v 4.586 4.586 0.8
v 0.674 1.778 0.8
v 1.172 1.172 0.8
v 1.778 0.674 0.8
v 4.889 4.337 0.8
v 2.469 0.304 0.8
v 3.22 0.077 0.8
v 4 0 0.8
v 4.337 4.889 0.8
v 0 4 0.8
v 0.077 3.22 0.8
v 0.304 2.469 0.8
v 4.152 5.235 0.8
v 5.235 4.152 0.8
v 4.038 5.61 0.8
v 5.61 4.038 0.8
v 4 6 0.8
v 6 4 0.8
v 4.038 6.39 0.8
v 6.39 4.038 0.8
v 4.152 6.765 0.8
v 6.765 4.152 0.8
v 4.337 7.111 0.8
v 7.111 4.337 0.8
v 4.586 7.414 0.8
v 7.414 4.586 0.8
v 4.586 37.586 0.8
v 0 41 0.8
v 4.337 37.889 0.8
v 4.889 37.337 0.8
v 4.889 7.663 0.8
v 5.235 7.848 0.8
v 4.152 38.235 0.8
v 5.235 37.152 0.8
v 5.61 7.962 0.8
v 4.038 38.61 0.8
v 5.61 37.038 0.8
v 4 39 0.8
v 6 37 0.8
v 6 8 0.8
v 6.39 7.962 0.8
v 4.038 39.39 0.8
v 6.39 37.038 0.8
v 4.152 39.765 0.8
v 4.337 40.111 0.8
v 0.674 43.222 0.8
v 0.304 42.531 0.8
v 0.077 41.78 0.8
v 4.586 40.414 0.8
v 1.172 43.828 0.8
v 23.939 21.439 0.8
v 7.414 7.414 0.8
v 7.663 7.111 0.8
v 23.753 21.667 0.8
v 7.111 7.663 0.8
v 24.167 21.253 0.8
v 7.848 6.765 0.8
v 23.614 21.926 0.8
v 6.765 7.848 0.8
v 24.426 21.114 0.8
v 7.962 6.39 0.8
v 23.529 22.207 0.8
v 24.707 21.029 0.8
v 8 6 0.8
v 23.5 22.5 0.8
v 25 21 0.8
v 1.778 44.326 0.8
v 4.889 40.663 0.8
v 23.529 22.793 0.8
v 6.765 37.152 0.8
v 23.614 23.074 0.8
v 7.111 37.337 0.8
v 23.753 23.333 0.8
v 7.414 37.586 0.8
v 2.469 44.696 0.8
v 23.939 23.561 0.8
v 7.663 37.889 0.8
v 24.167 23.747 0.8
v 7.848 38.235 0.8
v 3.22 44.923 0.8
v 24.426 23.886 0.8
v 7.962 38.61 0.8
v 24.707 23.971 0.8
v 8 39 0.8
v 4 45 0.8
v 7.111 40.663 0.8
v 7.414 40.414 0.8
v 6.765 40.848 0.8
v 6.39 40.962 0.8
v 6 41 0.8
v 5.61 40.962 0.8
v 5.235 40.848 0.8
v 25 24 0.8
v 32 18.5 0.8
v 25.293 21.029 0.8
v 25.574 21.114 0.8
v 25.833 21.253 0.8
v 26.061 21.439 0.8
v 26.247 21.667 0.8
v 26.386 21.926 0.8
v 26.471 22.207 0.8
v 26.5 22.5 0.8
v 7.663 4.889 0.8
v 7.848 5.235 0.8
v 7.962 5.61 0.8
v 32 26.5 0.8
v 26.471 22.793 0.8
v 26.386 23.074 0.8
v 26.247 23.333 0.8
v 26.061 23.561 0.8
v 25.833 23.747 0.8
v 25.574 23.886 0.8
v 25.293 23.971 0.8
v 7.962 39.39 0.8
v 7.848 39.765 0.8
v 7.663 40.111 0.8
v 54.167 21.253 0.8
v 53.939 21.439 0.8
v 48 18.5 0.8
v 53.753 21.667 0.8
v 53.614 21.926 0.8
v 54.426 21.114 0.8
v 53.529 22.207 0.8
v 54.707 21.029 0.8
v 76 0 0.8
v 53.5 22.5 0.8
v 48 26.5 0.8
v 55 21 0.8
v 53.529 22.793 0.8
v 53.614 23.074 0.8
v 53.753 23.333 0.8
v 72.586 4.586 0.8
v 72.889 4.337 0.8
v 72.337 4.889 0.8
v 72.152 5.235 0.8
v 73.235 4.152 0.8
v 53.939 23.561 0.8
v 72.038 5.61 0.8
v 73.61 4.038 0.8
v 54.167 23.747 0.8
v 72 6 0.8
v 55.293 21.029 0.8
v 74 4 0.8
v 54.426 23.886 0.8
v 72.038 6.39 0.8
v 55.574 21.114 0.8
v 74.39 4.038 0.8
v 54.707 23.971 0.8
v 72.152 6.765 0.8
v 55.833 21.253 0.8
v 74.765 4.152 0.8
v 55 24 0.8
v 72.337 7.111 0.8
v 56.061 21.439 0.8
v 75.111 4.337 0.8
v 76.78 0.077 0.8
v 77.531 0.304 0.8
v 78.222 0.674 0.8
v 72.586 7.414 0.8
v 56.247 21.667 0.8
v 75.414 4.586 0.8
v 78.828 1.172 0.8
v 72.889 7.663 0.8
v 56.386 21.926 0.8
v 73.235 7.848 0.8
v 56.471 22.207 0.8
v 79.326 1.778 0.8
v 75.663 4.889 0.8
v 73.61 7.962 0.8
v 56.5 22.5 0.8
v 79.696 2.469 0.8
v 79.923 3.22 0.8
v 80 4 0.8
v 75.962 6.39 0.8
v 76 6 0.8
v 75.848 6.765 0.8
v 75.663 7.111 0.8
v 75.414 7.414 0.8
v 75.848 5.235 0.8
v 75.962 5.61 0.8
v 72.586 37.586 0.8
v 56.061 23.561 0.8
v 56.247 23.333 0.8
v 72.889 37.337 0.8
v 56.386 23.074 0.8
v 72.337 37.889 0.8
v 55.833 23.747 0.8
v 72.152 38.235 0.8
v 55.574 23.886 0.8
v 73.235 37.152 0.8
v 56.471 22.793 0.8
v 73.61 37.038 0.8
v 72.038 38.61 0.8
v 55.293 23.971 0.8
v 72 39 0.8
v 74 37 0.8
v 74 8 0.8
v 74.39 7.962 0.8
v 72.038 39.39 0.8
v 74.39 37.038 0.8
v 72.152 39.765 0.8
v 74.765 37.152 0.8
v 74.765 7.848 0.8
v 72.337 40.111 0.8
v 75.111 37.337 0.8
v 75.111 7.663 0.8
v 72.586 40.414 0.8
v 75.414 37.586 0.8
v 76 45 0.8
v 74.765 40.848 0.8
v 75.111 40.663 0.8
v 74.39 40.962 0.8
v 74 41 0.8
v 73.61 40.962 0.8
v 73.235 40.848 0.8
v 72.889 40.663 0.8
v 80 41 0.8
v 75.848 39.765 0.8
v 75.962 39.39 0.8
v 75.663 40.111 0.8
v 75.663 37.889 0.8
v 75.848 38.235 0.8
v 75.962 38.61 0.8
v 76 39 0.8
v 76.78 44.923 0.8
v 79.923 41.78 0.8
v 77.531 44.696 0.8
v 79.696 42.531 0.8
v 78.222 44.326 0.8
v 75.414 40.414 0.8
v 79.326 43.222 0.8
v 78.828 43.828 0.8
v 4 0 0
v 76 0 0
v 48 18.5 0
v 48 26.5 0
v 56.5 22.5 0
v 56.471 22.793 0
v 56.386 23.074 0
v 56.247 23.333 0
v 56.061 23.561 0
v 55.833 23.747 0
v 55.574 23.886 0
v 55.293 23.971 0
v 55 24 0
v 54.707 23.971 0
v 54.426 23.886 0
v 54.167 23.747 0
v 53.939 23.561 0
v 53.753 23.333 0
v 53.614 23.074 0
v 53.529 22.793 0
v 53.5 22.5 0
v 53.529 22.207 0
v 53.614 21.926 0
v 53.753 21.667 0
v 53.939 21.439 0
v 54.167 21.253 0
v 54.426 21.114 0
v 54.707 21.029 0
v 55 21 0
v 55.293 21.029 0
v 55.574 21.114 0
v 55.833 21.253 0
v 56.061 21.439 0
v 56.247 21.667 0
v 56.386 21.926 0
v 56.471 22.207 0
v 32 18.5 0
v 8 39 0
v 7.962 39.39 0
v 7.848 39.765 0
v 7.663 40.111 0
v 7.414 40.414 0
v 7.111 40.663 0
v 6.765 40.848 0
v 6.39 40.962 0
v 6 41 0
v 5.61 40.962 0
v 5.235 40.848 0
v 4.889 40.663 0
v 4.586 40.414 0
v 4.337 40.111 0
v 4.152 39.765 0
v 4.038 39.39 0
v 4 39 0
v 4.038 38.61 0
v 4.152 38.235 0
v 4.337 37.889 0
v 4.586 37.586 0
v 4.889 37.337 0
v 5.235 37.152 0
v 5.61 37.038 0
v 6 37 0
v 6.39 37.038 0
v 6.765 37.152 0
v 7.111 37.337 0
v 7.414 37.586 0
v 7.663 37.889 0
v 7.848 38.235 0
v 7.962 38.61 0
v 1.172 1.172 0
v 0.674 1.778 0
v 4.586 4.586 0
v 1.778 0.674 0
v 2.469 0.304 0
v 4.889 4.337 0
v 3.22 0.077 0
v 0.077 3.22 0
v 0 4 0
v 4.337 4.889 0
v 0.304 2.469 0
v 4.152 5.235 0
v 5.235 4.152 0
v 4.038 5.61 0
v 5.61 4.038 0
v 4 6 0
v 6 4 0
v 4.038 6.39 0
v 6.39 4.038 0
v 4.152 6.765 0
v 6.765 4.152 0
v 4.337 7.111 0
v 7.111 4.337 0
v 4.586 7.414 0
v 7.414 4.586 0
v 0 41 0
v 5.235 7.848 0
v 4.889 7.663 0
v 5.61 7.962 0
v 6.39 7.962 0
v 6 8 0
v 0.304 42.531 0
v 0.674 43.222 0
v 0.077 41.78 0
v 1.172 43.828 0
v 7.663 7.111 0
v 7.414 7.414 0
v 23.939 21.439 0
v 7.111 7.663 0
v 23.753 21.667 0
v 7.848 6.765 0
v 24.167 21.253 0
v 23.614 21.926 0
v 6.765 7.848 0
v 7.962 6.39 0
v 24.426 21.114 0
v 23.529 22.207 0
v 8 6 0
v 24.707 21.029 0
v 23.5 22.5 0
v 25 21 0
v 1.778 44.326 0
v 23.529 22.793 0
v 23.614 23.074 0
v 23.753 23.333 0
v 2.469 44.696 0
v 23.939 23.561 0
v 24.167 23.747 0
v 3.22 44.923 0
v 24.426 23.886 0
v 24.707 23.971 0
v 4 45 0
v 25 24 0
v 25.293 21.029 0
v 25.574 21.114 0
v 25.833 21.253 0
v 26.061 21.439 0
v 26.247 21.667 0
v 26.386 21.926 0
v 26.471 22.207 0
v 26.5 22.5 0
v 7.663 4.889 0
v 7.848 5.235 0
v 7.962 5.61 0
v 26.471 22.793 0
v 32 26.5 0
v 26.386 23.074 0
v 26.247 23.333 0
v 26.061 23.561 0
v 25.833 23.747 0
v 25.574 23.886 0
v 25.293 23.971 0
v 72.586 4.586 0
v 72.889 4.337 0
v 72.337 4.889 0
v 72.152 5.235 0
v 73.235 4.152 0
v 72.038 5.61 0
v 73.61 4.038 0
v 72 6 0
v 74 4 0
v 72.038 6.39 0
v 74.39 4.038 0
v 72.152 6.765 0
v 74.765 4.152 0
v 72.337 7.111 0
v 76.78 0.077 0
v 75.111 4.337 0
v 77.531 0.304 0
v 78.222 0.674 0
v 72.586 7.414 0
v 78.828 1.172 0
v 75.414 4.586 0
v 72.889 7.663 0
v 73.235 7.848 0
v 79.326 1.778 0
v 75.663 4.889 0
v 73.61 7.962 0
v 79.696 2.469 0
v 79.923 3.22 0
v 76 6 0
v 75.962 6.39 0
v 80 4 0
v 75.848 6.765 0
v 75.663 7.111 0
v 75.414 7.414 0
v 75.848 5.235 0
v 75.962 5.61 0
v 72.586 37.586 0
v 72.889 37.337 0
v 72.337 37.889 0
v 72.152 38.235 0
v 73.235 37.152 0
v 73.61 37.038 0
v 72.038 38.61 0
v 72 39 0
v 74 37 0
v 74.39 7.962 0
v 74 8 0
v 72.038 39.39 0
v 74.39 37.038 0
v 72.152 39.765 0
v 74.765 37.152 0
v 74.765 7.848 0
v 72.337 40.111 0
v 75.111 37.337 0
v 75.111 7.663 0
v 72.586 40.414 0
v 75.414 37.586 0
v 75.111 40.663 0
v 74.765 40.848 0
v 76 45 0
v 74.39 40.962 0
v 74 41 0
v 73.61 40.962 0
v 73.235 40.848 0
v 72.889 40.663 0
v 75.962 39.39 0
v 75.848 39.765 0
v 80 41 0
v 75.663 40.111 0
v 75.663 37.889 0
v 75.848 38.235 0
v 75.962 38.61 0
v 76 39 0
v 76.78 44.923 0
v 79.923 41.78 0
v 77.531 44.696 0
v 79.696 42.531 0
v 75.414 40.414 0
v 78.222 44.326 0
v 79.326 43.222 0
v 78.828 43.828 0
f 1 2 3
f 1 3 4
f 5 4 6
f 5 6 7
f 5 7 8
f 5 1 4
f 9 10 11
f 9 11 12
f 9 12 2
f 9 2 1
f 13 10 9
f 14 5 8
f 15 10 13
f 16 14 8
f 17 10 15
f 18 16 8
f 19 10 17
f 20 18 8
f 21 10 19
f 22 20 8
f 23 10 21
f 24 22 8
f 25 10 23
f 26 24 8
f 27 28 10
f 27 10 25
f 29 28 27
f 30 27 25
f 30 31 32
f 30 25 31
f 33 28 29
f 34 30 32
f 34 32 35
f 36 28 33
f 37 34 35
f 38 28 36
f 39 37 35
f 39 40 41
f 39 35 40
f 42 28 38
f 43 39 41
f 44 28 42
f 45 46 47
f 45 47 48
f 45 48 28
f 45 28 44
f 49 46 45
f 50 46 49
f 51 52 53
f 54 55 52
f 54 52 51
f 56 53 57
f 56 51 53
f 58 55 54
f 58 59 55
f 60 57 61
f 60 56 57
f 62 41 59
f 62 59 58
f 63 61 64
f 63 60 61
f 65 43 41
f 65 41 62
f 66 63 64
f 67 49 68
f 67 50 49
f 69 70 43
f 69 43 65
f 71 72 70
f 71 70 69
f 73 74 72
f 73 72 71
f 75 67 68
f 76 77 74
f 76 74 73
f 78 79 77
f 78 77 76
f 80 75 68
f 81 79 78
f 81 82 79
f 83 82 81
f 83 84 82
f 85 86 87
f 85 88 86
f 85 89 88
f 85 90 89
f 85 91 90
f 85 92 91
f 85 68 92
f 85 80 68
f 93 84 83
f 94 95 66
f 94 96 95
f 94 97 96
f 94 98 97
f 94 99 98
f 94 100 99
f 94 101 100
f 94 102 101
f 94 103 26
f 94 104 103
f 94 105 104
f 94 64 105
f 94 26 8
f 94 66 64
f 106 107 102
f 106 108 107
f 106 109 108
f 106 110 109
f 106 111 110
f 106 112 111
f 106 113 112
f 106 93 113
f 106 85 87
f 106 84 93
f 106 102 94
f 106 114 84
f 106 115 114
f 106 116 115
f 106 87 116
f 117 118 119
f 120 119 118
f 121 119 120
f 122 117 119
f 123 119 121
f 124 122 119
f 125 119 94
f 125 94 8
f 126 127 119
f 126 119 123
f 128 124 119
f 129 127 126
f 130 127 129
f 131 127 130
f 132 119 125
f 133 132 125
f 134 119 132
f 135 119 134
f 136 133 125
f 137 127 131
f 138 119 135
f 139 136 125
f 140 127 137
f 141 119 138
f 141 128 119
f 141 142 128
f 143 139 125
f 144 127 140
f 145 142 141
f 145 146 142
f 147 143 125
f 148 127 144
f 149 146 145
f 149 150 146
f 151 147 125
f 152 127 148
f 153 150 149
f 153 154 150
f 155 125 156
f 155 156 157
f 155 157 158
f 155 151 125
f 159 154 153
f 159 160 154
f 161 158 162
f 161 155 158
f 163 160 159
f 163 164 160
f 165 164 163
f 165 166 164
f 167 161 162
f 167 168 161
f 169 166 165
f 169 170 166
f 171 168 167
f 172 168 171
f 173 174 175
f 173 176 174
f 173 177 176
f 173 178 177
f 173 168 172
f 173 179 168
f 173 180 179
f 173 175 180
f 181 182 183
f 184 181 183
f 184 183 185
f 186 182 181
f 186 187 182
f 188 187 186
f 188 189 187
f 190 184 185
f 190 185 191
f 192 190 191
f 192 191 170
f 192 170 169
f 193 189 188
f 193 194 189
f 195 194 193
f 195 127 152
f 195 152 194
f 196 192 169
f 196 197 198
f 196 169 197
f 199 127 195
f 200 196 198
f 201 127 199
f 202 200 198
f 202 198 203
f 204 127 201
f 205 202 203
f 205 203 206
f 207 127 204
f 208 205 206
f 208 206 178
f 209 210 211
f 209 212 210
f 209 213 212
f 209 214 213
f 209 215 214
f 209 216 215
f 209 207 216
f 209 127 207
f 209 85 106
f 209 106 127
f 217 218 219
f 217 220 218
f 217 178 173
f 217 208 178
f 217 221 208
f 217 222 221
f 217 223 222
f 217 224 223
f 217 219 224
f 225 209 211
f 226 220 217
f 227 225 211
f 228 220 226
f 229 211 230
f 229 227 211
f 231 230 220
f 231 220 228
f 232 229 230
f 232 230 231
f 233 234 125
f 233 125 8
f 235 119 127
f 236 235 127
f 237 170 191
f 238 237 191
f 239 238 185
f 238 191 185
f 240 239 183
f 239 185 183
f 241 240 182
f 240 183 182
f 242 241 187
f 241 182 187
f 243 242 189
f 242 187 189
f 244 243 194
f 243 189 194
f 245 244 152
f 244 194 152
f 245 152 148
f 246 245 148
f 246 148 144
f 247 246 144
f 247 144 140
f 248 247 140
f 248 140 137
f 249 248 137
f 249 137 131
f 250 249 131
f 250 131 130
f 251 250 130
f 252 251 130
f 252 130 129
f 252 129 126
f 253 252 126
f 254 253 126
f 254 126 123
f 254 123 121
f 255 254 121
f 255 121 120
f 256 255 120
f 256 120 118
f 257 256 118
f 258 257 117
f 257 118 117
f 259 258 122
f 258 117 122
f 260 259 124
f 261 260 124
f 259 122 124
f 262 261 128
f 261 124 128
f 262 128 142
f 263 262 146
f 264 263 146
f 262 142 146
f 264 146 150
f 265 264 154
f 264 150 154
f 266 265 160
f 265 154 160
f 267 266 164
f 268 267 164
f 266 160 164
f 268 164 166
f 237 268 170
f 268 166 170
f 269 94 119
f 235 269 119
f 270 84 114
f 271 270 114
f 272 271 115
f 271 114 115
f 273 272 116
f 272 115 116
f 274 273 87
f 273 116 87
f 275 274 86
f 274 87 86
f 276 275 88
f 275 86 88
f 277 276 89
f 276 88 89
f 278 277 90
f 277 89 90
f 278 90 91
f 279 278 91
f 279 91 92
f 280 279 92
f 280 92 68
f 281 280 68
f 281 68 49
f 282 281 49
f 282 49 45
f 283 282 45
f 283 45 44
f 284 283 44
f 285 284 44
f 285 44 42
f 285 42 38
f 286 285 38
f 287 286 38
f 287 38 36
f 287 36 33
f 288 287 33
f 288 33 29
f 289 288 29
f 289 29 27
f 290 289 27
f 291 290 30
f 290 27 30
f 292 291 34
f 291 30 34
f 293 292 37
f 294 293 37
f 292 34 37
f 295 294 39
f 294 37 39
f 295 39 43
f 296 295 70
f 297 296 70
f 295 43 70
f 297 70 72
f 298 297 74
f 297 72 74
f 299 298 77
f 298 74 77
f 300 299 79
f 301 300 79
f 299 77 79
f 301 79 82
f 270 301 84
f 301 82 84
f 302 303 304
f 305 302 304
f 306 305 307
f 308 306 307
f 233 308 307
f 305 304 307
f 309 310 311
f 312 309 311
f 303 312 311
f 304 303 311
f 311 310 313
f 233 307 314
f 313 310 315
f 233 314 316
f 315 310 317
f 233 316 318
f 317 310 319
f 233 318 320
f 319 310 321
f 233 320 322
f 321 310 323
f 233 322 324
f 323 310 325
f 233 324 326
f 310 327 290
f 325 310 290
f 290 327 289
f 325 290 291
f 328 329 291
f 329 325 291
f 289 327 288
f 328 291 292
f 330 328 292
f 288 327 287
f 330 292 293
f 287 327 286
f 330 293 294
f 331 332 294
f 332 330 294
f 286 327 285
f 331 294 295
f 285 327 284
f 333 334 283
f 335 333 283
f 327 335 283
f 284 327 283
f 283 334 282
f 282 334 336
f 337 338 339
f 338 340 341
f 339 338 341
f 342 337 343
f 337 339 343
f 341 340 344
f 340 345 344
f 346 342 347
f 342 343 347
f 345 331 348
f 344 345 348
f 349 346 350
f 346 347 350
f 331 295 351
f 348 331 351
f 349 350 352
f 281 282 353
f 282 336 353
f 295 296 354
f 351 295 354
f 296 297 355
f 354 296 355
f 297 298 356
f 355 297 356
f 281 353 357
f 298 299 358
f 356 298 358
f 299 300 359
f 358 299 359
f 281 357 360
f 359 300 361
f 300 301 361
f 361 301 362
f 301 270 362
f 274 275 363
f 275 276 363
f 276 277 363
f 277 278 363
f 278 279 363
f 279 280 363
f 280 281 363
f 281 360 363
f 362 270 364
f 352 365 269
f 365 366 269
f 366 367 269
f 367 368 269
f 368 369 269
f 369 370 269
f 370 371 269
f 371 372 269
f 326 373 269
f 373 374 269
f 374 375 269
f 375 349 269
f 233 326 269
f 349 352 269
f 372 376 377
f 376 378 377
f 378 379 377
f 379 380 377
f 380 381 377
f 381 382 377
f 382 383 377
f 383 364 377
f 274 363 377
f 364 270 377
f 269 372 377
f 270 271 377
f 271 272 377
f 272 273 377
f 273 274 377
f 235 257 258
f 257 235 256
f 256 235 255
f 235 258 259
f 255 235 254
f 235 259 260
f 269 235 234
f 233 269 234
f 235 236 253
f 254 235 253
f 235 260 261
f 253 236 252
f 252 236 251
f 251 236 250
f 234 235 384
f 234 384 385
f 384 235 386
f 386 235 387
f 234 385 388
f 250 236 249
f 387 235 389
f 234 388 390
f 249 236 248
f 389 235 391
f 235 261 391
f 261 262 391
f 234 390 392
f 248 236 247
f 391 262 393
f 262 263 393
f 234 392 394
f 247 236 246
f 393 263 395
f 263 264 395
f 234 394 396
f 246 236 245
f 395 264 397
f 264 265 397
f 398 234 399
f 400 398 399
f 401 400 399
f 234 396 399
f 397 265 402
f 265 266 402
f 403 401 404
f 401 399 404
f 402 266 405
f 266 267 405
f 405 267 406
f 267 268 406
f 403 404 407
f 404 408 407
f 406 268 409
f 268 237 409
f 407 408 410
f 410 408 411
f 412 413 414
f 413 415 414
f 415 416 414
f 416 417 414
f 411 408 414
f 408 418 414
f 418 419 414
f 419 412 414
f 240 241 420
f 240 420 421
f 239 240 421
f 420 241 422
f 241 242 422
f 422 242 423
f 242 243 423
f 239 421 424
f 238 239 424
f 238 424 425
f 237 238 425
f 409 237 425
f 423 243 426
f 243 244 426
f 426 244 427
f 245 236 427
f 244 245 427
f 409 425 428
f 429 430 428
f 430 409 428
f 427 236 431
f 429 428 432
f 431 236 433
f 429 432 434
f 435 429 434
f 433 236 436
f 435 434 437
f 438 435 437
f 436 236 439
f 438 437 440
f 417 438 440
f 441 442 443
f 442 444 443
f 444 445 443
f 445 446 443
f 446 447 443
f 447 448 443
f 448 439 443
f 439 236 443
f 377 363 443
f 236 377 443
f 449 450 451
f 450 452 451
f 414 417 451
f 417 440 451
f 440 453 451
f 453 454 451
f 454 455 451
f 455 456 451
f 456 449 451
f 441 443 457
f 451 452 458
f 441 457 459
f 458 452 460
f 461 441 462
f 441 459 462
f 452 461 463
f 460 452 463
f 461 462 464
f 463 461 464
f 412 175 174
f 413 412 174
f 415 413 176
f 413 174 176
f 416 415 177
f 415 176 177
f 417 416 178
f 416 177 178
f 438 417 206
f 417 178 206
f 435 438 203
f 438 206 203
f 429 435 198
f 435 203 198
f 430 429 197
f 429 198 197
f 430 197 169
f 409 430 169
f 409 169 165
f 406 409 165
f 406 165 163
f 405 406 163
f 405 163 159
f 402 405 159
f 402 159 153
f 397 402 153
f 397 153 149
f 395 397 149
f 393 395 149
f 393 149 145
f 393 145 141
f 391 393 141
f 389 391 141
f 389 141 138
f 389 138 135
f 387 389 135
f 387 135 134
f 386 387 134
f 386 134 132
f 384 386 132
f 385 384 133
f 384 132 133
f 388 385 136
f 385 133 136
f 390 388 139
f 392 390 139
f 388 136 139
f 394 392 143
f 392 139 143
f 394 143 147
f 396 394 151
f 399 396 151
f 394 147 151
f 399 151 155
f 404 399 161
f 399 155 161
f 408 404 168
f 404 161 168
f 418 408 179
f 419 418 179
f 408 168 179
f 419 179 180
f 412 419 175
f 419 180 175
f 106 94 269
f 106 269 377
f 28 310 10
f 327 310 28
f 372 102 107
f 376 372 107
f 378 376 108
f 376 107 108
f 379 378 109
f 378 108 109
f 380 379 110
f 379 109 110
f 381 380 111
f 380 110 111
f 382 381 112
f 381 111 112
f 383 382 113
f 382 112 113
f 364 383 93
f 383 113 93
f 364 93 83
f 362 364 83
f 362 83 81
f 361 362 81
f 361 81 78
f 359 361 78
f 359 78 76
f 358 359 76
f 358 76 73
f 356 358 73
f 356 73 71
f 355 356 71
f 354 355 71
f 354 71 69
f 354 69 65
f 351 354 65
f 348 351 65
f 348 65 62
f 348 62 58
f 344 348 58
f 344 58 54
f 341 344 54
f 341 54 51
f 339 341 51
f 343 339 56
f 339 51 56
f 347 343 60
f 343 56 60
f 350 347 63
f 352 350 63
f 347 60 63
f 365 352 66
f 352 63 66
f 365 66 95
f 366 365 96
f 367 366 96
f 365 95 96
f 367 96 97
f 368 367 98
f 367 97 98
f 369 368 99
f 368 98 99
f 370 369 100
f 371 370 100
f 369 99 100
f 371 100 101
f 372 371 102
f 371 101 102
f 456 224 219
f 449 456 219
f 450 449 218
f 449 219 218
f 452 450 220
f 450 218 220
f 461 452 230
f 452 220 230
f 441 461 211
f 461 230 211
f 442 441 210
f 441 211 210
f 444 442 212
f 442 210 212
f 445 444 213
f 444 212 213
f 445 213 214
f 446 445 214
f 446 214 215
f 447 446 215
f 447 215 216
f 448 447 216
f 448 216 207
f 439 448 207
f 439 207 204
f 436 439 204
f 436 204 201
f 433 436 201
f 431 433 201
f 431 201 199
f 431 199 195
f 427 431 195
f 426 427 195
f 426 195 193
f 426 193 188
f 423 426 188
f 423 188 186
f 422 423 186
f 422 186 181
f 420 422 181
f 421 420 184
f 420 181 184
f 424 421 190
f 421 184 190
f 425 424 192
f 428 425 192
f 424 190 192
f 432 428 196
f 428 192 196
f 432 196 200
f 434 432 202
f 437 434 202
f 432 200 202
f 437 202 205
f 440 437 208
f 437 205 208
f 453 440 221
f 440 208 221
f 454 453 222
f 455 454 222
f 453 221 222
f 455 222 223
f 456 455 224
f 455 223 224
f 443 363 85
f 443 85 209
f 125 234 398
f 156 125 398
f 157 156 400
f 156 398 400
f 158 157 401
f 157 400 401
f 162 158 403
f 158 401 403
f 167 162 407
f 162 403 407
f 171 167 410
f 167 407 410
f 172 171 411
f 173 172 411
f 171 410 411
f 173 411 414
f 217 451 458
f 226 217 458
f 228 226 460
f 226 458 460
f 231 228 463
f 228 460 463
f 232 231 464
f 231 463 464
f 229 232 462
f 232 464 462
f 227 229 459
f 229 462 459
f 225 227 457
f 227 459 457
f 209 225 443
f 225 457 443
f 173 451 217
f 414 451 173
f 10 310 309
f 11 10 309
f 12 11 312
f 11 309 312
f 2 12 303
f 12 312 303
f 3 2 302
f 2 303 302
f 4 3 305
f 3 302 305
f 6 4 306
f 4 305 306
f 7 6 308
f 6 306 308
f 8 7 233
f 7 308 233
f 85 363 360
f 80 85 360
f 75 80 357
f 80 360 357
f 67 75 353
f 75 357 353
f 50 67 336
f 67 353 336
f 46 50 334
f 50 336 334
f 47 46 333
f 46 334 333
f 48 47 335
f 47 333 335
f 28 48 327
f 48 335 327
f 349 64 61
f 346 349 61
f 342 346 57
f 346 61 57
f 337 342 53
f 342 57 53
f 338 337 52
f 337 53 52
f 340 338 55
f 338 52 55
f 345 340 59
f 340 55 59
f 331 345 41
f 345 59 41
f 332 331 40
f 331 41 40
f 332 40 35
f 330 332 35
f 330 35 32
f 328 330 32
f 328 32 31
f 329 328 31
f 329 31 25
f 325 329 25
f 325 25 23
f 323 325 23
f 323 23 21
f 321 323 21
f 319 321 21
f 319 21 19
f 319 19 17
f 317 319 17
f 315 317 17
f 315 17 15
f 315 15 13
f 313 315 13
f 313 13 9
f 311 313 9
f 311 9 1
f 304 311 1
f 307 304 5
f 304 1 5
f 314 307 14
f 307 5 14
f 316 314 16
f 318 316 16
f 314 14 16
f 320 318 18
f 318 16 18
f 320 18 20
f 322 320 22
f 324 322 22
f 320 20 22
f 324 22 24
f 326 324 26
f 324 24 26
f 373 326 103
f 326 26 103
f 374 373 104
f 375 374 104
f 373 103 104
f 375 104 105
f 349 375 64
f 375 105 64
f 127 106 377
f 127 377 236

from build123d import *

# Parameters (mm, degrees)
PAD_DEPTH       = 0.8
SKETCH001_W     = 16
SKETCH001_H     = 8
POCKET_DEPTH    = 0.801
SKETCH002_R     = 1.5
POCKET001_DEPTH = 0.801
SKETCH003_R     = 2
POCKET002_DEPTH = 0.801


with BuildPart() as part:
    # Sketch → Pad (new body)
    with BuildSketch(Plane.XY):
        with BuildLine():
            ThreePointArc((4, 45), (1.171573, 43.828427), (0, 41))
            Line((0, 4), (0, 41))
            ThreePointArc((0, 4), (1.171573, 1.171573), (4, 0))
            Line((76, 0), (4, 0))
            ThreePointArc((76, 0), (78.828427, 1.171573), (80, 4))
            Line((80, 41), (80, 4))
            ThreePointArc((80, 41), (78.828427, 43.828427), (76, 45))
            Line((4, 45), (76, 45))
        make_face()
    extrude(amount=PAD_DEPTH)

    # Sketch001 (on Face10 of Pad) → Pocket (cut, through all)
    with BuildSketch(Plane.XY.offset(0.8)):
        with Locations((40, 22.5)):
            Rectangle(SKETCH001_W, SKETCH001_H)
    extrude(amount=-POCKET_DEPTH, mode=Mode.SUBTRACT)

    # Sketch002 (on Face5 of Pocket) → Pocket001 (cut, through all)
    with BuildSketch(Plane.XY.offset(0.8)):
        with Locations((55, 22.5)):
            Circle(SKETCH002_R)
        with Locations((25, 22.5)):
            Circle(SKETCH002_R)
    extrude(amount=-POCKET001_DEPTH, mode=Mode.SUBTRACT)

    # Sketch003 (on Face5 of Pocket001) → Pocket002 (cut, through all)
    with BuildSketch(Plane.XY.offset(0.8)):
        with Locations((6, 39)):
            Circle(SKETCH003_R)
        with Locations((74, 39)):
            Circle(SKETCH003_R)
        with Locations((74, 6)):
            Circle(SKETCH003_R)
        with Locations((6, 6)):
            Circle(SKETCH003_R)
    extrude(amount=-POCKET002_DEPTH, mode=Mode.SUBTRACT)


solid = part.part
